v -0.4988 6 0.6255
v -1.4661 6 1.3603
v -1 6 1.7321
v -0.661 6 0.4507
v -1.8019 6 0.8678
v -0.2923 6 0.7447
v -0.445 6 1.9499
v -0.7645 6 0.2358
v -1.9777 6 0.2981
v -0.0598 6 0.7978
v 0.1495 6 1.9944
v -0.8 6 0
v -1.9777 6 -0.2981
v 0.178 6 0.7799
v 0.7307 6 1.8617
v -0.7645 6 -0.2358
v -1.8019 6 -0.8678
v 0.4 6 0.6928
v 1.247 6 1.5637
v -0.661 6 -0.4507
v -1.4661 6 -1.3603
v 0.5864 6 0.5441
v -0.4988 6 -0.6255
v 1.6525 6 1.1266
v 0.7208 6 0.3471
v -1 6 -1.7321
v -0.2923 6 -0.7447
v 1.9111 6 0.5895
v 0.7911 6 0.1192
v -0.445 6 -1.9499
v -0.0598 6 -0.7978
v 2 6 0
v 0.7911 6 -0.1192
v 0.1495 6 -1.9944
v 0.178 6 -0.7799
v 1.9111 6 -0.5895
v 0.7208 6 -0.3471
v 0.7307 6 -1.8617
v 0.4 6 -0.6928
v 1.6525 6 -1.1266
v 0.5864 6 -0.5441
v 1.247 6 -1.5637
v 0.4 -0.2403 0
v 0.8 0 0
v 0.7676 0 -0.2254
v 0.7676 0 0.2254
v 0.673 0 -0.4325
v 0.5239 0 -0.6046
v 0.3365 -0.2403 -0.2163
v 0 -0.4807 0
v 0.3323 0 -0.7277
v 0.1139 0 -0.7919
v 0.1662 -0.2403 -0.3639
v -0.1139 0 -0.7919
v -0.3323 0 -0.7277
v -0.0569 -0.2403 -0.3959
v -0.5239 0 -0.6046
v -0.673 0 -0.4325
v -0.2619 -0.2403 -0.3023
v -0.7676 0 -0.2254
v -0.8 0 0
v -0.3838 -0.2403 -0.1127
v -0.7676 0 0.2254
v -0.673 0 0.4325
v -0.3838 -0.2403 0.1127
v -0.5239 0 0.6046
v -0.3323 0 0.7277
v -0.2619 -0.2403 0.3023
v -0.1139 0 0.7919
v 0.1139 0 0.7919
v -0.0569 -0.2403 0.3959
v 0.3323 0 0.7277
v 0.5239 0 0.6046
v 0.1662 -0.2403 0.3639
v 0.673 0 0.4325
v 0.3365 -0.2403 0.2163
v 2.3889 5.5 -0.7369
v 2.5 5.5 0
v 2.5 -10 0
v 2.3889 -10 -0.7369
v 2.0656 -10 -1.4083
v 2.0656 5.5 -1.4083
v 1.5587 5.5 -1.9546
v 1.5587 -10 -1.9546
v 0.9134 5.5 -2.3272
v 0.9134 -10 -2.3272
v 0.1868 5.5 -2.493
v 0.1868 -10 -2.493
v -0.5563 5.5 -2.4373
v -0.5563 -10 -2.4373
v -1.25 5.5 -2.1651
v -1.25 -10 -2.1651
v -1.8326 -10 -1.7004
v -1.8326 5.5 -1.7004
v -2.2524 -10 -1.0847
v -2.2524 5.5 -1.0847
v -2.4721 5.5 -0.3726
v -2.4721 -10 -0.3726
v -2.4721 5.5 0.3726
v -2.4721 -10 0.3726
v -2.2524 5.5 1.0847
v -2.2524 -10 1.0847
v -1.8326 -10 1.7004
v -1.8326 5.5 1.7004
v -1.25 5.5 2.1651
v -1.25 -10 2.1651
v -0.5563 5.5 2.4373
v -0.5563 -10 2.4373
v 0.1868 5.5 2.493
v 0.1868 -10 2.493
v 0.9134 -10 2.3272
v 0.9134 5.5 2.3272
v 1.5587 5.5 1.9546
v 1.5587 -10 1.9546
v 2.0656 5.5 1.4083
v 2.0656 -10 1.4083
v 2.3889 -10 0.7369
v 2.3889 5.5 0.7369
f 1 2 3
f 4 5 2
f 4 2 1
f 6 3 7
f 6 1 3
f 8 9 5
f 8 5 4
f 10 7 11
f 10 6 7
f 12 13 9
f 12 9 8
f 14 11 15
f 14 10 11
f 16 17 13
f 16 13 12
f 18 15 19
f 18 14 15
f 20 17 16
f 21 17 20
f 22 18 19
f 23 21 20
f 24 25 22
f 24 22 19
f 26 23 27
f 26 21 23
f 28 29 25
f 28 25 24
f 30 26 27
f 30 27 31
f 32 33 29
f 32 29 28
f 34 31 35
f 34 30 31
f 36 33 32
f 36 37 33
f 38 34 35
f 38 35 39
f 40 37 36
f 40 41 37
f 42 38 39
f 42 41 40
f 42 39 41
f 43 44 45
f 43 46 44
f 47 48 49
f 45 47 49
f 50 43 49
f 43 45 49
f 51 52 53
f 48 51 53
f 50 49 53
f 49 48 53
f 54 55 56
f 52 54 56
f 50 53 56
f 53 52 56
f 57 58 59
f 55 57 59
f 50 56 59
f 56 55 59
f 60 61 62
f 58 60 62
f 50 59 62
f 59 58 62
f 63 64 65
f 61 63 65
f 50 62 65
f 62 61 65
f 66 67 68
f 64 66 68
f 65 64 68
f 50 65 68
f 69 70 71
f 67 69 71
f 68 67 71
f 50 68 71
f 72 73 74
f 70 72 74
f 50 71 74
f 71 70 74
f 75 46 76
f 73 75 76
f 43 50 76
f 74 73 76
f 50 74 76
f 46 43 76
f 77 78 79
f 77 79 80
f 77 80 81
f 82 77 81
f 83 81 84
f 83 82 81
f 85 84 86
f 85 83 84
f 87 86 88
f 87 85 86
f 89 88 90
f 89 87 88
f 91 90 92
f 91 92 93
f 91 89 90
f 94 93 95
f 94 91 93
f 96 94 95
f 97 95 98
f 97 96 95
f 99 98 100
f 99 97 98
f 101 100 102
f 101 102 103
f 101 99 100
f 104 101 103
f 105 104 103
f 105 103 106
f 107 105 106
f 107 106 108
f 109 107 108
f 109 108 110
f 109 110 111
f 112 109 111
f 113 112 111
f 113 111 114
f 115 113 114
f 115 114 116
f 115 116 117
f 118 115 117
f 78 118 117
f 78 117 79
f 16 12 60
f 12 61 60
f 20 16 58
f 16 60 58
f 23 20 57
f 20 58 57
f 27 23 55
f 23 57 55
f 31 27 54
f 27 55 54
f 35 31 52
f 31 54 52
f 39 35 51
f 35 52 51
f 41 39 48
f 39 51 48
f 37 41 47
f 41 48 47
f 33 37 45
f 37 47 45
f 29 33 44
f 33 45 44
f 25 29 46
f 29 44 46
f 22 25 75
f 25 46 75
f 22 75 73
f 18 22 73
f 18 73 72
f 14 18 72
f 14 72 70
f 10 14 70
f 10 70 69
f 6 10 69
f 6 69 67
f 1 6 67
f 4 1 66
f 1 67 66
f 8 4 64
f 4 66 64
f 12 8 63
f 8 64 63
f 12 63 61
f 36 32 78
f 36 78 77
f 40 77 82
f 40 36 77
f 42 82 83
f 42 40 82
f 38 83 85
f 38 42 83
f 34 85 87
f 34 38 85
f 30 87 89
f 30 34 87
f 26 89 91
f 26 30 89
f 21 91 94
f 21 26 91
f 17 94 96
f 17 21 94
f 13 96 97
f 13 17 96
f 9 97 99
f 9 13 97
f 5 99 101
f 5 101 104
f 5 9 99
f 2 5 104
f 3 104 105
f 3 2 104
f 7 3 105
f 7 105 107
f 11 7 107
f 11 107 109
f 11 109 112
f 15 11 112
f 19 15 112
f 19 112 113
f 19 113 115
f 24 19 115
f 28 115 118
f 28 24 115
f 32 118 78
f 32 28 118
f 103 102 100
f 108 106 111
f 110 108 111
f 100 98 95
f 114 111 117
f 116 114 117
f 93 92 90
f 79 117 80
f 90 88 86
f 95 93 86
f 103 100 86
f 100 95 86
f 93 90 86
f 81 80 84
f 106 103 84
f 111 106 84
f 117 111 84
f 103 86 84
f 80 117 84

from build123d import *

# Parameters (mm, degrees)
ESQUISSE1_R             = 2.5
BOSS_EXTRU_1_DEPTH      = 6
BOSS_EXTRU_1_DEPTH_BACK = 10
TROU_TARAUD_M21_D       = 1.6
TROU_TARAUD_M21_DEPTH   = 6
TROU_TARAUD_M21_TIP     = 0.480688495
CHANFREIN1_SIZE         = 0.5


with BuildPart() as part:
    # Esquisse1 → Boss.-Extru.1 (new body, two sides)
    with BuildSketch(Plane(origin=(0, 0, 0), x_dir=(1, 0, 0), z_dir=(0, 1, 0))) as boss_extru_1_sk:
        Circle(ESQUISSE1_R)
    extrude(amount=BOSS_EXTRU_1_DEPTH)
    extrude(boss_extru_1_sk.sketch, amount=-BOSS_EXTRU_1_DEPTH_BACK)

    # Trou taraudé M21
    with Locations(Plane(origin=(0, 6, 0), x_dir=(1, 0, 0), z_dir=(0, 1, 0))):
        with Locations((0, 0)):
            Hole(TROU_TARAUD_M21_D / 2, depth=TROU_TARAUD_M21_DEPTH)
            with Locations((0, 0, -(TROU_TARAUD_M21_DEPTH + TROU_TARAUD_M21_TIP / 2))):  # 118° drill point
                Cone(0, TROU_TARAUD_M21_D / 2, TROU_TARAUD_M21_TIP, mode=Mode.SUBTRACT)

    # Chanfrein1
    chanfrein1_edges = [part.edges().sort_by_distance(p)[0] for p in [
        (-2.5, 6, 0),
    ]]
    chamfer(chanfrein1_edges, length=CHANFREIN1_SIZE)


solid = part.part
